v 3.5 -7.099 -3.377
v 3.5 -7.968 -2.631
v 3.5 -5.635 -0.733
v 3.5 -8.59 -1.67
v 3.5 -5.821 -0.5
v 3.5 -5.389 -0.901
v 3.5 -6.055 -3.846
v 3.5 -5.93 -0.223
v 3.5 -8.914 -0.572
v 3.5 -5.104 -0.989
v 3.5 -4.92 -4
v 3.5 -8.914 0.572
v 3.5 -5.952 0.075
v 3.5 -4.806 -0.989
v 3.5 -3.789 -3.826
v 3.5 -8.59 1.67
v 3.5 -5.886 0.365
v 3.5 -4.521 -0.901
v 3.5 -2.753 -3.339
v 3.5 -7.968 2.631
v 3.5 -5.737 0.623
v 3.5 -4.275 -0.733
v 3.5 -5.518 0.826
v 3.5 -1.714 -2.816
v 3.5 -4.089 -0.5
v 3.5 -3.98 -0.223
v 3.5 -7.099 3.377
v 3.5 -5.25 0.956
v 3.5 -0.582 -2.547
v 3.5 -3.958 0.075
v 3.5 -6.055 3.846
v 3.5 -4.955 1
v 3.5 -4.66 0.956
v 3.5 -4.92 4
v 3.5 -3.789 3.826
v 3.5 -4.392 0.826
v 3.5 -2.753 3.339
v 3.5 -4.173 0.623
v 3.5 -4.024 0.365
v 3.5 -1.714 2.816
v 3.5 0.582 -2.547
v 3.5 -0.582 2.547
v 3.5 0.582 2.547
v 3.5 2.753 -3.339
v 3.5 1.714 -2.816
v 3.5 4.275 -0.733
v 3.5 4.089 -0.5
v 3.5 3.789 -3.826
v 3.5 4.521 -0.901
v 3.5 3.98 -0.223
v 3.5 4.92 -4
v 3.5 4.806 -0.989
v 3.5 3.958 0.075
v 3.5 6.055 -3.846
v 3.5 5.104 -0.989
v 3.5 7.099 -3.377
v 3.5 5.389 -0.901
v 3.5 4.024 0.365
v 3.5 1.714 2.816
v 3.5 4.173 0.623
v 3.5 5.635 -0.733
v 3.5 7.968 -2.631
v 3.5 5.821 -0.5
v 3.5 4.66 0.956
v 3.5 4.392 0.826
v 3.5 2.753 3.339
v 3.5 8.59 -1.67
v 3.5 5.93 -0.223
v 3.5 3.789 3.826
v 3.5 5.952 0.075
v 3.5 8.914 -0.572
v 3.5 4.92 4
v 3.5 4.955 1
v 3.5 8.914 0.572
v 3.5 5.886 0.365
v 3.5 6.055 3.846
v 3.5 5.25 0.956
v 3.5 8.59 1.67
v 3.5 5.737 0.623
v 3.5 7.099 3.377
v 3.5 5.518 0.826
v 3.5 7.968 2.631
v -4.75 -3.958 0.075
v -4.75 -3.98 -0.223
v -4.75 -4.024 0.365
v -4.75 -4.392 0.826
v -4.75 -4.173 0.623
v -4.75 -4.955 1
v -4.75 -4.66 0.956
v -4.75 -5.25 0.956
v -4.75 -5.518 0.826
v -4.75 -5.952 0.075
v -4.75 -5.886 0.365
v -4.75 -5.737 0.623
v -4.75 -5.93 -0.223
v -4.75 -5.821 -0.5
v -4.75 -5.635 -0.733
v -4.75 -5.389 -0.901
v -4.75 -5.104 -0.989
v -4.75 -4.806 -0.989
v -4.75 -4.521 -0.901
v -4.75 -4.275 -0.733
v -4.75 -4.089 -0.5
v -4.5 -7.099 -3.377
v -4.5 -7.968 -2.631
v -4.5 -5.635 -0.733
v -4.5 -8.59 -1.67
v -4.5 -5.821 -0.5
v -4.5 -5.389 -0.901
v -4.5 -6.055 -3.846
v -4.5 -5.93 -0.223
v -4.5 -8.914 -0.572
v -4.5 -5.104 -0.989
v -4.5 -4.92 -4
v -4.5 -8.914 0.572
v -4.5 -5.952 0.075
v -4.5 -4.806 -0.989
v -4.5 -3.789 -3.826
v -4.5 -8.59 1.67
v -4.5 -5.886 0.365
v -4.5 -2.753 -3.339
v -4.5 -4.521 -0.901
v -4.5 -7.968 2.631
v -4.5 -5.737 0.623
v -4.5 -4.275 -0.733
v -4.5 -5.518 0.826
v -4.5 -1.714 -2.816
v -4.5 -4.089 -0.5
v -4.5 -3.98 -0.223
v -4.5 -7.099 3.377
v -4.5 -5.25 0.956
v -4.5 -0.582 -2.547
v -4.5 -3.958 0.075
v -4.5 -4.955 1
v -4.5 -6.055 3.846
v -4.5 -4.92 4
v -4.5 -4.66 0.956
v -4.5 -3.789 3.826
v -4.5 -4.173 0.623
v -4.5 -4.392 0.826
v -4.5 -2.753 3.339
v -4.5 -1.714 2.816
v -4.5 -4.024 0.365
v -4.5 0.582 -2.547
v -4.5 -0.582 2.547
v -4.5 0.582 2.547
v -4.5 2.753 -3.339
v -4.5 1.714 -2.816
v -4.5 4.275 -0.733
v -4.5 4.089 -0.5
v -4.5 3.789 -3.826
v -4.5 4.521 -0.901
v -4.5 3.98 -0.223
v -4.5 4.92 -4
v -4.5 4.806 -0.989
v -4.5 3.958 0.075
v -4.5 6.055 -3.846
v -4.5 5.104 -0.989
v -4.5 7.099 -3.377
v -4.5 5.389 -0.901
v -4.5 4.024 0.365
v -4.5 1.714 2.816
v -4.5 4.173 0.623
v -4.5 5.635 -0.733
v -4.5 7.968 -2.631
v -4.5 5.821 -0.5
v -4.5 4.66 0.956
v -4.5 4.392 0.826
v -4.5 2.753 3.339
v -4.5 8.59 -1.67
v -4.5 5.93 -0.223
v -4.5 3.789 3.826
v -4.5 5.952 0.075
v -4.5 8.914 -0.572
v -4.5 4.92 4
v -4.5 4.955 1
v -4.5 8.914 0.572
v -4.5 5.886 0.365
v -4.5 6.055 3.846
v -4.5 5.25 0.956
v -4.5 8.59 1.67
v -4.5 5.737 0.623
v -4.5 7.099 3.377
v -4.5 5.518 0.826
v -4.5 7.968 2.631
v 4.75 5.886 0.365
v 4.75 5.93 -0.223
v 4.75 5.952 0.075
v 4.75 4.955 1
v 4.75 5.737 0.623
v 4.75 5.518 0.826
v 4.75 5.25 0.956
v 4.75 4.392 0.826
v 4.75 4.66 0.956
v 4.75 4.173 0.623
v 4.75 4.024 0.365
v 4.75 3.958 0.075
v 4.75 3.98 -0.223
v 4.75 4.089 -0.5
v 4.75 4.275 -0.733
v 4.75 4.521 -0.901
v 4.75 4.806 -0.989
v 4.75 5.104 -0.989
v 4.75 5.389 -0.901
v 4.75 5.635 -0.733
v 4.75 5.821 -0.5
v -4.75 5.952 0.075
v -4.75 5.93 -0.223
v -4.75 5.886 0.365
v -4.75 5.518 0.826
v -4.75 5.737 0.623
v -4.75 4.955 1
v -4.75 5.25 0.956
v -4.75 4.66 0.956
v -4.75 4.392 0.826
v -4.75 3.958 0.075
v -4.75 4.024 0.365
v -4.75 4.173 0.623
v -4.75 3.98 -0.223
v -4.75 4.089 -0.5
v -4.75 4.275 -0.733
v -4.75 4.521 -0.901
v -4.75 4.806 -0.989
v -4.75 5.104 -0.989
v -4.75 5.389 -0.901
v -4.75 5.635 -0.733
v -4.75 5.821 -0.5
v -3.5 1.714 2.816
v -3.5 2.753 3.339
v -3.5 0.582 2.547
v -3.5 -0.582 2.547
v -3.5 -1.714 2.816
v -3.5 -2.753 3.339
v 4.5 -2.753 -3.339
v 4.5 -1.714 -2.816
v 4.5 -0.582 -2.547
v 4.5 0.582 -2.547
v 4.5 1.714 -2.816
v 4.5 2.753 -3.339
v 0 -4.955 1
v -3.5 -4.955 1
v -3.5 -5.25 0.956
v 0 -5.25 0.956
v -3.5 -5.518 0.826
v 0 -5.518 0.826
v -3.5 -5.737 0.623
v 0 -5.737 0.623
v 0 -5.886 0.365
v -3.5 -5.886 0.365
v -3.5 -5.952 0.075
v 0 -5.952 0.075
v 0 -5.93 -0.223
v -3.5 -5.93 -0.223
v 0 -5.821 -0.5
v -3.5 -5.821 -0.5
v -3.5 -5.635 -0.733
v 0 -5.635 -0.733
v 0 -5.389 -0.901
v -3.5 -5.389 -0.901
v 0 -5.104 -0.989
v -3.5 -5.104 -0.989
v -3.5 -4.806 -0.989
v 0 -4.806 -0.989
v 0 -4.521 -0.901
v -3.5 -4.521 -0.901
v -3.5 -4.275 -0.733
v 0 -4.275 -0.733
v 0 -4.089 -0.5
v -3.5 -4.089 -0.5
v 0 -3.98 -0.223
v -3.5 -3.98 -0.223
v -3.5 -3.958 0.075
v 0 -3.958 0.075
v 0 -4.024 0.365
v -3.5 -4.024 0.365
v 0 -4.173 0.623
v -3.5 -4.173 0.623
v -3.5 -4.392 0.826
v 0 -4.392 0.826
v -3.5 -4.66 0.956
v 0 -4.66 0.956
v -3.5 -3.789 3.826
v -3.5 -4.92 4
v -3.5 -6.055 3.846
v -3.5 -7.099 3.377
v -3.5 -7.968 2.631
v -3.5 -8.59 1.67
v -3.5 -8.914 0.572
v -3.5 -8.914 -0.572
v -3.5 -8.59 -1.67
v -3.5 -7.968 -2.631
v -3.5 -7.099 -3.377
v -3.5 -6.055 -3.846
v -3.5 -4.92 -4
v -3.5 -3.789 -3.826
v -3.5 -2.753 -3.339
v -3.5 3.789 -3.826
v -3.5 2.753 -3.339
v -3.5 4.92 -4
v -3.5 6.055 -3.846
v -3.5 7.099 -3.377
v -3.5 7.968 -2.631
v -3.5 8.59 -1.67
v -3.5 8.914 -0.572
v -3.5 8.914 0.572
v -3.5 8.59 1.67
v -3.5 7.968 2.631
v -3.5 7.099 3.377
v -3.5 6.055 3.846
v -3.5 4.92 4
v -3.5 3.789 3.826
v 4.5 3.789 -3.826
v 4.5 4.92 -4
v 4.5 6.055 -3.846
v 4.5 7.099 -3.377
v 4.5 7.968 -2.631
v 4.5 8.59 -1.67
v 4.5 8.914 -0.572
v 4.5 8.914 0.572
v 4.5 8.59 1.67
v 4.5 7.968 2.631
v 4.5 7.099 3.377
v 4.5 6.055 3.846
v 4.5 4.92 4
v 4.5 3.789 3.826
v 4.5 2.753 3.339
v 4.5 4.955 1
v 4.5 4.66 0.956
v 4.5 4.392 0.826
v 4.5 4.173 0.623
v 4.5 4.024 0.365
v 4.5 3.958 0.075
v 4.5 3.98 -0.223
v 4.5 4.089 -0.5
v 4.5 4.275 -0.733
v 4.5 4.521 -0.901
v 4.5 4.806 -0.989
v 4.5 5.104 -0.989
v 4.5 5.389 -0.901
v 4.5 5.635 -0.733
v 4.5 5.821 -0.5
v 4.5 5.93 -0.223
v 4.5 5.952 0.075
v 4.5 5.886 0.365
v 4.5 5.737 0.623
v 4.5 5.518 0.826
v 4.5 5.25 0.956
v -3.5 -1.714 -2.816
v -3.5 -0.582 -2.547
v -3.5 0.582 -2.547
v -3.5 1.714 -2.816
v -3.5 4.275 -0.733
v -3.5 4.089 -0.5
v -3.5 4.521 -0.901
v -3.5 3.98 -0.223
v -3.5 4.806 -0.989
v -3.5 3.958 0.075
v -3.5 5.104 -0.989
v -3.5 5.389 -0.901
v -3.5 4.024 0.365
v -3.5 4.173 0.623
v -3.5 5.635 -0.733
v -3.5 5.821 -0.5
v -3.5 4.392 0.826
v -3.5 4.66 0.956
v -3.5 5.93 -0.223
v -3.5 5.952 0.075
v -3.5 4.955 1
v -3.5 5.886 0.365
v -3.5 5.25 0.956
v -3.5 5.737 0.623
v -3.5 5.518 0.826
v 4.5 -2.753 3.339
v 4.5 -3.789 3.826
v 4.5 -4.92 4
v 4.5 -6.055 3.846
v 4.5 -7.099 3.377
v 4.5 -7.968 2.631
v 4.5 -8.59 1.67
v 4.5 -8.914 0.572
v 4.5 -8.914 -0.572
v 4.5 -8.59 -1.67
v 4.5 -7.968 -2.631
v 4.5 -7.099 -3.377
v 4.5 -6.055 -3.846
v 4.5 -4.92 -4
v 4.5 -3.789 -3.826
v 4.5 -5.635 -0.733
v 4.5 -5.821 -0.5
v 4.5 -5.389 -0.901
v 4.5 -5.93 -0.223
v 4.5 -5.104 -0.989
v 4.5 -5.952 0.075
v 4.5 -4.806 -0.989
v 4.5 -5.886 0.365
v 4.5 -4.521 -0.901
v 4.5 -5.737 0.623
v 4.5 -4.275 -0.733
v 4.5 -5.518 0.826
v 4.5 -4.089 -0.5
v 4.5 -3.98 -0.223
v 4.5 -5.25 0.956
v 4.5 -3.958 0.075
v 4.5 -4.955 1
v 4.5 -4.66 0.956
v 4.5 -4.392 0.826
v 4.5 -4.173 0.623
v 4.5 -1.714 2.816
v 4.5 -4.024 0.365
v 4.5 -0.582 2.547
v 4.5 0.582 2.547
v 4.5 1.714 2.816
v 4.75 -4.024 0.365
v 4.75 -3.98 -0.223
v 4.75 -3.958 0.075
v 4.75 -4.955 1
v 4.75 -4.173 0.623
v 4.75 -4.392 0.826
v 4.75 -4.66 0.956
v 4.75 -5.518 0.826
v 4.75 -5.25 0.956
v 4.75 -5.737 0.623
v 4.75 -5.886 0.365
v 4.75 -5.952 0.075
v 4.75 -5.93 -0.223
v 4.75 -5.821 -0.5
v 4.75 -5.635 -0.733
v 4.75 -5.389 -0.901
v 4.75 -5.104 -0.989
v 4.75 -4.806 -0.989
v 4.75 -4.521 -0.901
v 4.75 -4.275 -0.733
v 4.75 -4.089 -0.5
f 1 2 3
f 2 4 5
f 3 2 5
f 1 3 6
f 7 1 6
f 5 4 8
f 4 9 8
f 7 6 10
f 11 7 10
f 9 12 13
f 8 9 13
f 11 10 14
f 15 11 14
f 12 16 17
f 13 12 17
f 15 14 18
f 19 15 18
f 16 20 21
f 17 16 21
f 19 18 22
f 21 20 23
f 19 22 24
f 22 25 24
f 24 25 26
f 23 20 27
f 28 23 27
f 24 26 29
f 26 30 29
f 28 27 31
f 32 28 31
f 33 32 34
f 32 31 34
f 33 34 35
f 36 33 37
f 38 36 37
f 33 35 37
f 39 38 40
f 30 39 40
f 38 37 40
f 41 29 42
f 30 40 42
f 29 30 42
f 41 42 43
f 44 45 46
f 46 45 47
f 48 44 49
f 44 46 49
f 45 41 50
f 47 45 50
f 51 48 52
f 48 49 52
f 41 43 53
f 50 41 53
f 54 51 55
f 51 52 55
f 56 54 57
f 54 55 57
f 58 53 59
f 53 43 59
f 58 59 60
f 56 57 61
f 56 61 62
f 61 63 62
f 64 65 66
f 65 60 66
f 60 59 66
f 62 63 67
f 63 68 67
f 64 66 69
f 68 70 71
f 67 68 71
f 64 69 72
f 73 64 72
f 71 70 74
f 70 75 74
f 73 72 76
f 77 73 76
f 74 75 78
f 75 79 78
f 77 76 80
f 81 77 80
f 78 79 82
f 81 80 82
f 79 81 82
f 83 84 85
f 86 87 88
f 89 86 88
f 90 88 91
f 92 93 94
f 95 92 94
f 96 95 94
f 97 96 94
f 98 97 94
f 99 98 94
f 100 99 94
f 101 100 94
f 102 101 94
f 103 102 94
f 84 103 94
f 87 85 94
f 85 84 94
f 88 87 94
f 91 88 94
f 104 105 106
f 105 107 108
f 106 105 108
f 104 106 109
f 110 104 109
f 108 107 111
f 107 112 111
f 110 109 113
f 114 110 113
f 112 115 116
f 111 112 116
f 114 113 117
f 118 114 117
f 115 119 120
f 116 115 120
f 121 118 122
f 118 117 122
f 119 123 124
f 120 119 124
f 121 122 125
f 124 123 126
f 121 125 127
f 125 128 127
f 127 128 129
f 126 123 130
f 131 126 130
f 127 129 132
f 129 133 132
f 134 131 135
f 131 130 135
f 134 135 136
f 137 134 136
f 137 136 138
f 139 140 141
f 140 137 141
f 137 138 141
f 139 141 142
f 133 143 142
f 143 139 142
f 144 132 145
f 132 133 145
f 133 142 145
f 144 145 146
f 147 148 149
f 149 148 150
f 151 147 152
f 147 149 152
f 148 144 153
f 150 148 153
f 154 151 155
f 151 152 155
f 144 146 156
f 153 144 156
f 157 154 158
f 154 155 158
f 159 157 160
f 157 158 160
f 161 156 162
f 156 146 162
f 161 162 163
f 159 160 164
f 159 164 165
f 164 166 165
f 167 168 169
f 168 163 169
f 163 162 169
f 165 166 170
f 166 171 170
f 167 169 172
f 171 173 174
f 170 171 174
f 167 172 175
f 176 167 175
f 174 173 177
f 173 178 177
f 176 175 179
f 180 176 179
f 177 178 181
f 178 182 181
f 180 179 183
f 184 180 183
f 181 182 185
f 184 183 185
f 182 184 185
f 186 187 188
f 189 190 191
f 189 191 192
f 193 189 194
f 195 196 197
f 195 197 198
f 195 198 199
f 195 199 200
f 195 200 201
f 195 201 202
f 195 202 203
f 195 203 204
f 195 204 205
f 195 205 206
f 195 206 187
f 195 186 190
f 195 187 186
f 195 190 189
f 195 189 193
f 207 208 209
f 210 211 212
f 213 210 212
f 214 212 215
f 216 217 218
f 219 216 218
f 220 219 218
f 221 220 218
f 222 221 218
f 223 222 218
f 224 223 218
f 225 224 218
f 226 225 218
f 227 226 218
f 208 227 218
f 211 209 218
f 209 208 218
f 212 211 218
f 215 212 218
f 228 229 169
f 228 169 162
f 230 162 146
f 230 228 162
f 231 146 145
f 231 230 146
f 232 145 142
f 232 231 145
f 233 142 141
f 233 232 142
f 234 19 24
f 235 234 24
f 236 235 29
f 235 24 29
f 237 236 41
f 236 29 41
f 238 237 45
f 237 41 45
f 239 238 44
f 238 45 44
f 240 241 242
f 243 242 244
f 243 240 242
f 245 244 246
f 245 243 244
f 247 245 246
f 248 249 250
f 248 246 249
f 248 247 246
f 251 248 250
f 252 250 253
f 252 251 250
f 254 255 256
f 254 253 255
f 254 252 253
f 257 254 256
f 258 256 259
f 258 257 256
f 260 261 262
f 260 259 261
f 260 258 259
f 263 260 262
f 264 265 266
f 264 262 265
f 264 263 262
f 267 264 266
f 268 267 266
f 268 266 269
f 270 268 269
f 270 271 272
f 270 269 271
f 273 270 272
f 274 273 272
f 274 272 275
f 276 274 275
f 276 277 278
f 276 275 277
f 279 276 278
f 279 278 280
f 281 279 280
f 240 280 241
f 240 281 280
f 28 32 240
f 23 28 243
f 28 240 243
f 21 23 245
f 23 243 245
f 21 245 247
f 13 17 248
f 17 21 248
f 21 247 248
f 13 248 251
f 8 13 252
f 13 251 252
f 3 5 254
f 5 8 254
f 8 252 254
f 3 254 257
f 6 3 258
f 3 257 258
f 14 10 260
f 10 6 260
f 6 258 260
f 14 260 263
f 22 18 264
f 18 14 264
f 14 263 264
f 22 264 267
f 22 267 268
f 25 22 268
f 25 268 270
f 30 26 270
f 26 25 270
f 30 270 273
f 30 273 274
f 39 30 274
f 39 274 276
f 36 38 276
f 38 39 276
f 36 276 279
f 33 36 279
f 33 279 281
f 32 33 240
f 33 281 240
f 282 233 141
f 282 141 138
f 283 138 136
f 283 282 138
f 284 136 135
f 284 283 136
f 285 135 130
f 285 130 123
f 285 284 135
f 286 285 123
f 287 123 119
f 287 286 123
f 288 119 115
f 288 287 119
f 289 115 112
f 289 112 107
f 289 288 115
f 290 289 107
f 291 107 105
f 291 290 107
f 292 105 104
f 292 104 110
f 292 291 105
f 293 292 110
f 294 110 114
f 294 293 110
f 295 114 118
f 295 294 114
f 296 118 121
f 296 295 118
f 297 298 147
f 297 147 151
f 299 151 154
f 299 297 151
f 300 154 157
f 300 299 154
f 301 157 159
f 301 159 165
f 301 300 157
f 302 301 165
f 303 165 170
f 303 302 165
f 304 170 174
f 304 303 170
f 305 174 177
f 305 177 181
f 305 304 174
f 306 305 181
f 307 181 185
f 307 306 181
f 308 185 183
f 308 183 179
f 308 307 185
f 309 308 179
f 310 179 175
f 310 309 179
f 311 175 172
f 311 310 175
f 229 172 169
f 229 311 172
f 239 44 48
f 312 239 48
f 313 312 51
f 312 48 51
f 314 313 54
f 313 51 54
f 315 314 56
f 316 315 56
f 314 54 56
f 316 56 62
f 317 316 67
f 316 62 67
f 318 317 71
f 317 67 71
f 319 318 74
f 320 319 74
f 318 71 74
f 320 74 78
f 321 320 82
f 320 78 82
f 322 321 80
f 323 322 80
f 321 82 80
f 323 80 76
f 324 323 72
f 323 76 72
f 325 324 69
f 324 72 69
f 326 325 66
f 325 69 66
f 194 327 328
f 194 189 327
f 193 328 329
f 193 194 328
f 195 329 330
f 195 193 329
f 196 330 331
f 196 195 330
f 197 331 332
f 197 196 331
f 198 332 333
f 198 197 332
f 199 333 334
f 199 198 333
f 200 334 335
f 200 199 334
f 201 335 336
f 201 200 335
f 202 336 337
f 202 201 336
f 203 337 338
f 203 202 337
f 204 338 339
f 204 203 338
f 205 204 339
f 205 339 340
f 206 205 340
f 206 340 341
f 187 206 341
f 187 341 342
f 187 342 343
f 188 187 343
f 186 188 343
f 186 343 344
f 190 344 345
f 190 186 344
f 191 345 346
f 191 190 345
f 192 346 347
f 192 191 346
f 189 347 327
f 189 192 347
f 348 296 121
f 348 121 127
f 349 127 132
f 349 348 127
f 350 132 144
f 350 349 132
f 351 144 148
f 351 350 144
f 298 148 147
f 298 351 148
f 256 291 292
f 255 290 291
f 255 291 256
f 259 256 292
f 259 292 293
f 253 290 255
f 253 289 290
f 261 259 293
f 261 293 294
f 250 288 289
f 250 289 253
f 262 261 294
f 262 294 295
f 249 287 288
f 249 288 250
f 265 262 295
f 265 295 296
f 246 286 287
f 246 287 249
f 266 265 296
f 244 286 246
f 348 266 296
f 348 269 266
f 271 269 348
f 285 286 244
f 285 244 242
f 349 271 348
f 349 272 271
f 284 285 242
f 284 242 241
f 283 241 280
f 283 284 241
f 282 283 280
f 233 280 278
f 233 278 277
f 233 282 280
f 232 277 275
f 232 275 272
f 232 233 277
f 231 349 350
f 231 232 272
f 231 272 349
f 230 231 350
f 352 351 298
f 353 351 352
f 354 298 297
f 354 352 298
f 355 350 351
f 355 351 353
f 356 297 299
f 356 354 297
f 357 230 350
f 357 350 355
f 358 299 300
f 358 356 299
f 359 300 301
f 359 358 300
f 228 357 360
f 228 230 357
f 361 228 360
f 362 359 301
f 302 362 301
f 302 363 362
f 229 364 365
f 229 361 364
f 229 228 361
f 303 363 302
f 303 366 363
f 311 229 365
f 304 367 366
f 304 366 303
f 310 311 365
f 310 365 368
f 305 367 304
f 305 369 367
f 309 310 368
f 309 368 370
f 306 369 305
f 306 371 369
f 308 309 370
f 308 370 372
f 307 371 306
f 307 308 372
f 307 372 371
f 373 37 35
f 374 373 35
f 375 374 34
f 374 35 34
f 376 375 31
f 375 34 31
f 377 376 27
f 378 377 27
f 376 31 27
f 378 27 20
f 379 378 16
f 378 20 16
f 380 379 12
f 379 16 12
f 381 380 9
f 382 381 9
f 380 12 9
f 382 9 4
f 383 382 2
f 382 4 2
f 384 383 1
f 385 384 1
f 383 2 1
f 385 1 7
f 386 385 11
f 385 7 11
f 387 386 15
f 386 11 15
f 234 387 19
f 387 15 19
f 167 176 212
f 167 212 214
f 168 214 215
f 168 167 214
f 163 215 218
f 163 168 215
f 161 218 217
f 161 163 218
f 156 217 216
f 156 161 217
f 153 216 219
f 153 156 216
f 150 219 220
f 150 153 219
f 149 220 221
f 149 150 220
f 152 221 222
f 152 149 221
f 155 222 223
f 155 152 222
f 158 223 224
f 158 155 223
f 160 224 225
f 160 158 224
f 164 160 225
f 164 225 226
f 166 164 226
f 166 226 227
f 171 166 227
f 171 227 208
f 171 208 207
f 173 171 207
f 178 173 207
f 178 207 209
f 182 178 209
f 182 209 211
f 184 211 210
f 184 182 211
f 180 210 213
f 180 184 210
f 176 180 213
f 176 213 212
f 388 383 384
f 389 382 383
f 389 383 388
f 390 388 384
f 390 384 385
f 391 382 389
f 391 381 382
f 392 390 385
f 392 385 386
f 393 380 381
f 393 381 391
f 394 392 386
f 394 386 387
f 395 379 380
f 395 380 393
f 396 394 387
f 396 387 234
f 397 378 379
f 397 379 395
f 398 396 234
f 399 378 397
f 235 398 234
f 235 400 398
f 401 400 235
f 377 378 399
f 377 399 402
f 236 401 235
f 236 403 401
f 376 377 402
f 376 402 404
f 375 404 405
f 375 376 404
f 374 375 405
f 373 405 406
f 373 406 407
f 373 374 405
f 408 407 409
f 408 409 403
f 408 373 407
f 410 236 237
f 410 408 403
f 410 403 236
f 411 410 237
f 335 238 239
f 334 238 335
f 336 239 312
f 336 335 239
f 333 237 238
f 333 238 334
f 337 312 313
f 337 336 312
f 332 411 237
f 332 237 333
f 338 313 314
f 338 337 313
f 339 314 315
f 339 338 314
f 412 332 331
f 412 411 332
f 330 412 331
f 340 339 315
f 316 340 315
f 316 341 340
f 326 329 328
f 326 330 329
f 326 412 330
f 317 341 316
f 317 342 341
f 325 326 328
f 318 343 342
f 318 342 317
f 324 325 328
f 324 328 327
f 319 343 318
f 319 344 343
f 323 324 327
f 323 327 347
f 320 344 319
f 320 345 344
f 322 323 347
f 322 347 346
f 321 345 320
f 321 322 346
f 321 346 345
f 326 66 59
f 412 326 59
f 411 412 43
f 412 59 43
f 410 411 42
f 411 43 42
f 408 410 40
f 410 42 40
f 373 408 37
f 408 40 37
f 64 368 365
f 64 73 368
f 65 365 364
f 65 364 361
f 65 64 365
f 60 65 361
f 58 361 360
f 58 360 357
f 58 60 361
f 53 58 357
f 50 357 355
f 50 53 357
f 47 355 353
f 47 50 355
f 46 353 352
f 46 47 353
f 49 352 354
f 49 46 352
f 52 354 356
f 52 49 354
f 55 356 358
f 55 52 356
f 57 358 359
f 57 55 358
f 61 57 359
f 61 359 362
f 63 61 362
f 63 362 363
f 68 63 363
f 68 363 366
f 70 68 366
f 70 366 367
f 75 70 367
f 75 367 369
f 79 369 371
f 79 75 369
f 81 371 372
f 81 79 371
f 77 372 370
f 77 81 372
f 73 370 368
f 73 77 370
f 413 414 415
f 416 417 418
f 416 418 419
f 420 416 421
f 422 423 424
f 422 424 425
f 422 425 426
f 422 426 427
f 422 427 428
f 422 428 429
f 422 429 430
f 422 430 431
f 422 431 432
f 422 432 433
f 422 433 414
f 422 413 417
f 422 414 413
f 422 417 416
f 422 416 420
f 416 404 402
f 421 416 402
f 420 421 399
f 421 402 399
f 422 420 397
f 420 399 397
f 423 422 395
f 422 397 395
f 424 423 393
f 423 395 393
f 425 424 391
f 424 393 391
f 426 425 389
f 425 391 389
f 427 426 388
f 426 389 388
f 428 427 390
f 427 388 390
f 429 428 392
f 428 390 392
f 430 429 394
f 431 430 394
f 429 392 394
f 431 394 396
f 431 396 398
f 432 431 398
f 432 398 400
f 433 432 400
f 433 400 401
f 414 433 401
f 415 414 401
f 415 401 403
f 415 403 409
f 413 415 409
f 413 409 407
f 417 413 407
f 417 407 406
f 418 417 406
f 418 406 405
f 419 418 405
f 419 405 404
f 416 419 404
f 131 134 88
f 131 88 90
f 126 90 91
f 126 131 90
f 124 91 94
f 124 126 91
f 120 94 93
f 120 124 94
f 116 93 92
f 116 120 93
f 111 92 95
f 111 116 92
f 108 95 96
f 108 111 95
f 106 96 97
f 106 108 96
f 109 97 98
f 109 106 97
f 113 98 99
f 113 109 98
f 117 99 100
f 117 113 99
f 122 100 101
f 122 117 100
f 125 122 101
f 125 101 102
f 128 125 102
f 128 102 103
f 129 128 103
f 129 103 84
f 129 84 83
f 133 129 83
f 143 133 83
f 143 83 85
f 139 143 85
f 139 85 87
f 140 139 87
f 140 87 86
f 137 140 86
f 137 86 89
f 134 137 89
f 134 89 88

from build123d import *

# Parameters (mm, degrees)
BOSS_EXTRUDE1_START = 3.5
SKETCH1_R           = 1
BOSS_EXTRUDE1_DEPTH = 1
SKETCH2_R           = 1
BOSS_EXTRUDE2_DEPTH = 4.75


with BuildPart() as part:
    # Sketch1 → Boss-Extrude1 (new body)
    with BuildSketch(Plane.YZ.offset(BOSS_EXTRUDE1_START)):
        with BuildLine():
            ThreePointArc((-2.752777778, 3.339194107), (-8.955, 0), (-2.752777778, -3.339194107))
            ThreePointArc((-2.752777778, -3.339194107), (0, -2.513186741), (2.752777778, -3.339194107))
            ThreePointArc((2.752777778, -3.339194107), (8.955, 0), (2.752777778, 3.339194107))
            ThreePointArc((2.752777778, 3.339194107), (0, 2.513186741), (-2.752777778, 3.339194107))
        make_face()
        with Locations(Location((-4.955, 0, 0), (0, 0, 270))):
            Circle(SKETCH1_R, mode=Mode.SUBTRACT)
        with Locations(Location((4.955, 0, 0), (0, 0, 90))):
            Circle(SKETCH1_R, mode=Mode.SUBTRACT)
    extrude(amount=BOSS_EXTRUDE1_DEPTH)


with BuildPart() as body_2:
    # Mirror2: mirrored copy
    add(part.part.mirror(Plane(origin=(0, 0, 0), x_dir=(0, 0, 1), z_dir=(1, 0, 0))))


with BuildPart() as part_1:
    add(part.part)

    add(body_2.part)  # Boss-Extrude2 merges body 2
    # Sketch2 → Boss-Extrude2 (add, symmetric)
    with BuildSketch(Plane.YZ):
        with Locations(Location((-4.955, 0, 0), (0, 0, 90))):
            Circle(SKETCH2_R)
        with Locations(Location((4.955, 0, 0), (0, 0, 90))):
            Circle(SKETCH2_R)
    extrude(amount=BOSS_EXTRUDE2_DEPTH, both=True)


solid = part_1.part
